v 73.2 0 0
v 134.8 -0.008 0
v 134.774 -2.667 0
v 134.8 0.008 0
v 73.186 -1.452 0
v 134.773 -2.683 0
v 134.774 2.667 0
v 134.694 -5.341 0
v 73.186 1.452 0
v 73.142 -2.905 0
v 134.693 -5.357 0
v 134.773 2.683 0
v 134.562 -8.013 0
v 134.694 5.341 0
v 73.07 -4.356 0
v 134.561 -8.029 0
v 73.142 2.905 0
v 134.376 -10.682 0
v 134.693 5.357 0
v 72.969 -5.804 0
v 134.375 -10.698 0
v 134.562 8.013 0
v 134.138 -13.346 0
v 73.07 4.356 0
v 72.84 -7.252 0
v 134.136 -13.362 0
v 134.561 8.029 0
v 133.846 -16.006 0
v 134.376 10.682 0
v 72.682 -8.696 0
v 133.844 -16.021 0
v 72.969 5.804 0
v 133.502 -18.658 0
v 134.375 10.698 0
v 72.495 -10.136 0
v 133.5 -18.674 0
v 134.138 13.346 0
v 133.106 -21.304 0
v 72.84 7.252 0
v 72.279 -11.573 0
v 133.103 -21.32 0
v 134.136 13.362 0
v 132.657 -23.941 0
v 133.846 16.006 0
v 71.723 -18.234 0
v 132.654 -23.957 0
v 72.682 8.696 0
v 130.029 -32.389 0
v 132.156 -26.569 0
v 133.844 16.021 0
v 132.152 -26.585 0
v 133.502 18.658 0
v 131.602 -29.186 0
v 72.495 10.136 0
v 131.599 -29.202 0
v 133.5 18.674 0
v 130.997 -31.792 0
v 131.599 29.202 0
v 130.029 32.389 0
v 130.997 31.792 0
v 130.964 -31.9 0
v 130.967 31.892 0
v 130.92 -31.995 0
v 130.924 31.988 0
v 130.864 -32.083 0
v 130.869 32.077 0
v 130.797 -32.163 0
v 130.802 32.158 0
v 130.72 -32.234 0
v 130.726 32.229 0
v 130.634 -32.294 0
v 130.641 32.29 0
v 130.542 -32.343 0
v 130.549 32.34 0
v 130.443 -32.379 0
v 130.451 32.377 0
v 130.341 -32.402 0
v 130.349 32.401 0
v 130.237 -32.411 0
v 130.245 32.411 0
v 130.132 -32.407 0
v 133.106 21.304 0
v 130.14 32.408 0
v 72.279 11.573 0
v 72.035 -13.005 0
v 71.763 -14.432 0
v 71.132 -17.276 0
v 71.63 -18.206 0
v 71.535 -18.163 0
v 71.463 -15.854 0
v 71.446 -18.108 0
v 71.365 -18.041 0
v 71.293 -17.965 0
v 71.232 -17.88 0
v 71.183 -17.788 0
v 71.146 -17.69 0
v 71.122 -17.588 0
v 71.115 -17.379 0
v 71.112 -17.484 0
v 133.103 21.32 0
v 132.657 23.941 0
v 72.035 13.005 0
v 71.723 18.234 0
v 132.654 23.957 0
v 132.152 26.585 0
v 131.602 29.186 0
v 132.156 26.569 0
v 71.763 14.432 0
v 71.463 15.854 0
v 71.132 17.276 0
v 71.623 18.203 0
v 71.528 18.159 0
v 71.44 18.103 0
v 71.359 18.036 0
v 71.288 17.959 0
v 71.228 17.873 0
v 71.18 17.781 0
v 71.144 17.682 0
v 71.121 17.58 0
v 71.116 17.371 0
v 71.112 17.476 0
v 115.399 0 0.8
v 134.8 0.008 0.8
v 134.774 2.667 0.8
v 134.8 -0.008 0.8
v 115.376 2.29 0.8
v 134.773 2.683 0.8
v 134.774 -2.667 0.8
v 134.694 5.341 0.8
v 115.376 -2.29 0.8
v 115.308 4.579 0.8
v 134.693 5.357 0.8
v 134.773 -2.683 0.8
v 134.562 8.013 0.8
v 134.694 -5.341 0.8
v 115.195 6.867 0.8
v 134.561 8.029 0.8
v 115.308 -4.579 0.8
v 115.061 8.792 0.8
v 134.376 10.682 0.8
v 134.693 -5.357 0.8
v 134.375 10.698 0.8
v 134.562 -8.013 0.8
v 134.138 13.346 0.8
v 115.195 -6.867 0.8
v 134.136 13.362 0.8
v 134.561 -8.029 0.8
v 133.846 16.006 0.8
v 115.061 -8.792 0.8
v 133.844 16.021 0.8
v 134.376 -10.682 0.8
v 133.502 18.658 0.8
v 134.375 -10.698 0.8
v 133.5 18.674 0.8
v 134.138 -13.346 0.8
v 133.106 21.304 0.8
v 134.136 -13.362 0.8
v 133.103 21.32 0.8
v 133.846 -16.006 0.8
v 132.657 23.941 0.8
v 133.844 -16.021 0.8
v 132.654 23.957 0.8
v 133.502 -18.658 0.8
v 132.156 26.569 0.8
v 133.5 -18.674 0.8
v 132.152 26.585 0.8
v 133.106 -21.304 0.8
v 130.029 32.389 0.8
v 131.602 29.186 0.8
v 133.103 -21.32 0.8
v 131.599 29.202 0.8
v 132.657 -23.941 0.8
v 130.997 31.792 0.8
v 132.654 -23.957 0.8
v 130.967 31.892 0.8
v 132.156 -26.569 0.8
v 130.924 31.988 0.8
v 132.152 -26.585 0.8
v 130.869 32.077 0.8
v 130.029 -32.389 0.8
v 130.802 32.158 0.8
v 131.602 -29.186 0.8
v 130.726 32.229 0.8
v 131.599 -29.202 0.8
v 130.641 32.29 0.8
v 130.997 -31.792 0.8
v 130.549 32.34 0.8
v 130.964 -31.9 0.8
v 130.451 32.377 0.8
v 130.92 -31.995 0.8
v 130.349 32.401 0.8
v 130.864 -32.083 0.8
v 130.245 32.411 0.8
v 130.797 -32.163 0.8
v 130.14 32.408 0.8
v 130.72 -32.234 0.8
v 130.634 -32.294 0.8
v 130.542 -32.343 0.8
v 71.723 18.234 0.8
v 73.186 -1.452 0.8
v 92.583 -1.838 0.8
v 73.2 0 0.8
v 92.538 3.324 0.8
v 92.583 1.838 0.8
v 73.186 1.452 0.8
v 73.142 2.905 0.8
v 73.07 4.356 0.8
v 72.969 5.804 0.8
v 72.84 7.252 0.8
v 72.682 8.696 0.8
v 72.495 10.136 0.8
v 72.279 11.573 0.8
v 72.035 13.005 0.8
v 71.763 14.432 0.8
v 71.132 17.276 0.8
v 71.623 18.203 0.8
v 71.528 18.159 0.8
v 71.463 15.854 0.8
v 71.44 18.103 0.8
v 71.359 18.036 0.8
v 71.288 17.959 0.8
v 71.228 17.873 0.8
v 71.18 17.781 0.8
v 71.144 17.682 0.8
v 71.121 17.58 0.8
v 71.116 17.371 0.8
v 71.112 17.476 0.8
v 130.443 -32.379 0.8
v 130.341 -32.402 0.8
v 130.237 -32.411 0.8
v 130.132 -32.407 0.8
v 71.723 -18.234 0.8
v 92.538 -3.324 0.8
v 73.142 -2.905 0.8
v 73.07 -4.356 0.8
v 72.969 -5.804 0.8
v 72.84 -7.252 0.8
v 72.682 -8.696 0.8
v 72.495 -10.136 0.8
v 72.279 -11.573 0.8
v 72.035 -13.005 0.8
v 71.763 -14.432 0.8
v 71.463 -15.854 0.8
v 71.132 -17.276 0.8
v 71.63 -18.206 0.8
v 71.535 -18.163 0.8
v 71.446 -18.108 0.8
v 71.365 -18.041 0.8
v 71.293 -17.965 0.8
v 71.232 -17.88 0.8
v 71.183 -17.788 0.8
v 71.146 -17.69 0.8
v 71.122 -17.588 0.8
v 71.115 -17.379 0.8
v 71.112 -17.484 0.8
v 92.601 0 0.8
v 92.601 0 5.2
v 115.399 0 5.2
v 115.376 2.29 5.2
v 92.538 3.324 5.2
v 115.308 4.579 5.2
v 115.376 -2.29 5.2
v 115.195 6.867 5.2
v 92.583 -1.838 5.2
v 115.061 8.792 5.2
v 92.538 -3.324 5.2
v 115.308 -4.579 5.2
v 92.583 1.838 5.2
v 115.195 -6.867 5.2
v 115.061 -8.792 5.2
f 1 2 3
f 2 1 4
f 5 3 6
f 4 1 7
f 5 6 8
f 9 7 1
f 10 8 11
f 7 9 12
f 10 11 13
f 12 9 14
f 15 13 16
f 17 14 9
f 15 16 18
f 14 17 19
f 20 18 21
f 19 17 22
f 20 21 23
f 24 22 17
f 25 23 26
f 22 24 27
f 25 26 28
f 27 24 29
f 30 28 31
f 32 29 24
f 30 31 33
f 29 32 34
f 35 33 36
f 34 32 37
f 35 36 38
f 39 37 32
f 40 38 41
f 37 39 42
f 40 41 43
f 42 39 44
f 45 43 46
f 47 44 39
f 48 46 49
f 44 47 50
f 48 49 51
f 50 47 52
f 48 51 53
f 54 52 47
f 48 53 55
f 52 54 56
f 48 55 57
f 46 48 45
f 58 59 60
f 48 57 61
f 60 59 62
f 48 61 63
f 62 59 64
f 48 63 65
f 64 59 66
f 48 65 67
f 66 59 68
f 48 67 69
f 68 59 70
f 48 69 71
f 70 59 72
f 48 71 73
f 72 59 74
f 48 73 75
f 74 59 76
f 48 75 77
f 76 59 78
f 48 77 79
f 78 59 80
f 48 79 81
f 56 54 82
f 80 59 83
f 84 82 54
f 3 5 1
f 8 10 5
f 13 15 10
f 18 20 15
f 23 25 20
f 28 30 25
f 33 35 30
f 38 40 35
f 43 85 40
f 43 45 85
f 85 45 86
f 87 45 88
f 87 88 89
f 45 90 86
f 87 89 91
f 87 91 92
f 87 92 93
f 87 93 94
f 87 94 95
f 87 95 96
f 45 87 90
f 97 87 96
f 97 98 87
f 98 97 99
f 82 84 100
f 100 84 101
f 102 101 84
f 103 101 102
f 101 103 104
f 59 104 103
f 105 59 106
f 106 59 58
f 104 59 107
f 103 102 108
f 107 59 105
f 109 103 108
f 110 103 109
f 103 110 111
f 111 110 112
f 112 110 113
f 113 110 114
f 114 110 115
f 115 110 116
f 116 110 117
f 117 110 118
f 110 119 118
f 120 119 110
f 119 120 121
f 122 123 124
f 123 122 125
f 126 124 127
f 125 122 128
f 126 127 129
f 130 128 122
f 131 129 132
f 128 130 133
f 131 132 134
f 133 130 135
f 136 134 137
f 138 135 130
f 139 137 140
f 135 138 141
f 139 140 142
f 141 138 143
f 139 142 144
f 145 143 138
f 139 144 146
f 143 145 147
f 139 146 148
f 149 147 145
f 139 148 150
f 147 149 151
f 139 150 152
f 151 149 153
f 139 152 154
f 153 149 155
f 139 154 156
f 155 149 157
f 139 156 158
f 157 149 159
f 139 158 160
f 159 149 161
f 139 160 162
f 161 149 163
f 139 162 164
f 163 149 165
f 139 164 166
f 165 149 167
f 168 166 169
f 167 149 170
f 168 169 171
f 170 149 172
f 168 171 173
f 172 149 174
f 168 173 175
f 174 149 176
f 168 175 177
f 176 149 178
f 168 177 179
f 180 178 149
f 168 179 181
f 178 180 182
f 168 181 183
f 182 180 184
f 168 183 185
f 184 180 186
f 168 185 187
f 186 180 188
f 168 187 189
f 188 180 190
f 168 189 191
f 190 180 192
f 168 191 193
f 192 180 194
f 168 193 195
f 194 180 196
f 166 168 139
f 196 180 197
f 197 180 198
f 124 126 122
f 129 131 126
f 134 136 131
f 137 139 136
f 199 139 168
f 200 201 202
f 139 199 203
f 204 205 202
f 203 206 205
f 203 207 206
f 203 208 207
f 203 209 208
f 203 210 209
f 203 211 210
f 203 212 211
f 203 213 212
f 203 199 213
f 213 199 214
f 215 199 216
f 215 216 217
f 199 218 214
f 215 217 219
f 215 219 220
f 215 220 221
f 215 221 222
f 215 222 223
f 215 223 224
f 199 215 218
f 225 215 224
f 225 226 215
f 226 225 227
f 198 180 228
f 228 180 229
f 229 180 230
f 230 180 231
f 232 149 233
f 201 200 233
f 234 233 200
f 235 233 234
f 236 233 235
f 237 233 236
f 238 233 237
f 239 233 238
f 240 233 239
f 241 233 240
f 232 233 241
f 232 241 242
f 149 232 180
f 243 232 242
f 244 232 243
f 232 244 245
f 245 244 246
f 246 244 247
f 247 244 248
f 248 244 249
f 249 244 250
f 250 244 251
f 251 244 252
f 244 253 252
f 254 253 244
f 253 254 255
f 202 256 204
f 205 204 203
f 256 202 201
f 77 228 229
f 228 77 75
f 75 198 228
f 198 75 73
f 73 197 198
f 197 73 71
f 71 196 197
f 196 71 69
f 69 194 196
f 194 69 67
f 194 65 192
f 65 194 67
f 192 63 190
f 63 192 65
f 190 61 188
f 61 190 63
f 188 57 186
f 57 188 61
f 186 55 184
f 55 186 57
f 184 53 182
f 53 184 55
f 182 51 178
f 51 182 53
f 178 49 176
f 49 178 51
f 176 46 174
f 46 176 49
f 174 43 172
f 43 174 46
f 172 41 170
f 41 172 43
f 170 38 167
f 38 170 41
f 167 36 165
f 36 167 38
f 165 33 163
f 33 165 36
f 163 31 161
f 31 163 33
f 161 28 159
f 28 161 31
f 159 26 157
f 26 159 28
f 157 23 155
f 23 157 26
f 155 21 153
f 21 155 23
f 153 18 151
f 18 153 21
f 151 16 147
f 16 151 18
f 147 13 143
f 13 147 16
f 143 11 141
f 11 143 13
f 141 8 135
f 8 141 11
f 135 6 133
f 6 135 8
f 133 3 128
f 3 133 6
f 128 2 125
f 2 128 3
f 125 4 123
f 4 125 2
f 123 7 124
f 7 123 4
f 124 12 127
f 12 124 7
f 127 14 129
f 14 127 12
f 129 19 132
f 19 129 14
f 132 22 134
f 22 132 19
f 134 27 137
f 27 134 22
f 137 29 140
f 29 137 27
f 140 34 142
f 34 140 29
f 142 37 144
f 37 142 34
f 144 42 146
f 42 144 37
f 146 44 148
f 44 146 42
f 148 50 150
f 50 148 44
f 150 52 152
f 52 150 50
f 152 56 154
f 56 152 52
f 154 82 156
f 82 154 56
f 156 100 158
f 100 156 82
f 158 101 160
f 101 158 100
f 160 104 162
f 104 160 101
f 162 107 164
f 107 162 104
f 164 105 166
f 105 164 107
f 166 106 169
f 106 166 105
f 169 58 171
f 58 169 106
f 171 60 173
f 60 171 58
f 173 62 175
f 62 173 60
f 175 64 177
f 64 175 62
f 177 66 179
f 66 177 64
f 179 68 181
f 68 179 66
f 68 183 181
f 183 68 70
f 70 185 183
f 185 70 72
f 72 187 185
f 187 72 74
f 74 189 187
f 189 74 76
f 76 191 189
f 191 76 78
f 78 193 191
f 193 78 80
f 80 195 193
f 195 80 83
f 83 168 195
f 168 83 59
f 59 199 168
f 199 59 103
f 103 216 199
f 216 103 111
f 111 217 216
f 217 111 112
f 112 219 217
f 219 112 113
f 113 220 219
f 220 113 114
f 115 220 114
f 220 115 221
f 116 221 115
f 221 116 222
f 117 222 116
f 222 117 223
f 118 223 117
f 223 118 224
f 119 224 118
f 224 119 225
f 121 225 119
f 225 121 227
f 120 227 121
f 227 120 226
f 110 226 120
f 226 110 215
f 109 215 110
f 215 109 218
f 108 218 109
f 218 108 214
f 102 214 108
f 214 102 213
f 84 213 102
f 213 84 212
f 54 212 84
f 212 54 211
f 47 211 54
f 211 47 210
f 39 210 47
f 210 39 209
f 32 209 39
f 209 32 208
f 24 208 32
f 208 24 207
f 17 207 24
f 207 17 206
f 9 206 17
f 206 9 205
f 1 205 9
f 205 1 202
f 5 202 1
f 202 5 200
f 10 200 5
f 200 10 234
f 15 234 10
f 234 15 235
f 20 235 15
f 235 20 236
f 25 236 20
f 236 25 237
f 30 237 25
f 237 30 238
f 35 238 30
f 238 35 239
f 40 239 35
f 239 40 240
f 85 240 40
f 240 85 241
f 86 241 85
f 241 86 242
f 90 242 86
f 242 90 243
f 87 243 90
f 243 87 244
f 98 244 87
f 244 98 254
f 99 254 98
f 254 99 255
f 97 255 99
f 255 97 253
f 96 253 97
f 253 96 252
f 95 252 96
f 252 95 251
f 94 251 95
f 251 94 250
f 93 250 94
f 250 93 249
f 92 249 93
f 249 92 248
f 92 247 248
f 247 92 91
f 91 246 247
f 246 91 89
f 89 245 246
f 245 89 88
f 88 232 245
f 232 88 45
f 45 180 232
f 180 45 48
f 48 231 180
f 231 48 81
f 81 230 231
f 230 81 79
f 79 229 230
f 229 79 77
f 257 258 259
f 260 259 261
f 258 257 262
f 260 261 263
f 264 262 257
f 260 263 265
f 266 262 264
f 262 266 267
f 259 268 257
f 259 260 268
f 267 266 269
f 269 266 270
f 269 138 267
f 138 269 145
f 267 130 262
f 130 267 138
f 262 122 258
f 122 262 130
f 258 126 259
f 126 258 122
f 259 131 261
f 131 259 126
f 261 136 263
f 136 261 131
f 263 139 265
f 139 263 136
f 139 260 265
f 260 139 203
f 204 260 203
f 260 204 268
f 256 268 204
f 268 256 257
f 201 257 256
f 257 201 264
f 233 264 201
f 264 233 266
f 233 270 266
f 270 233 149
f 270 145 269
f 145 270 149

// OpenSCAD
// Gen-DI — bobbin BASE (bottom flange + hub). Print x12, flange down. Wind 24 AWG x 223 t around
// the hub with the LID glued on (coil_lid.stl). Copper lives ONLY between the flanges (no proud winds).
include <parameters.scad>;
$fn = 48;
module sector_2d(r_in, r_out, ang) {
    polygon([
        for (a = [-ang/2 : ang/24 : ang/2]) [r_in*cos(a), r_in*sin(a)],
        for (a = [ang/2 : -ang/24 : -ang/2]) [r_out*cos(a), r_out*sin(a)]
    ]);
}
module footprint_2d() { offset(r=wall) sector_2d(coil_id_r, coil_od_r, span_deg); }
module hub_2d()       { offset(delta=-coil_core_inset) sector_2d(coil_id_r, coil_od_r, span_deg); }

union() {
    linear_extrude(flange_t) footprint_2d();
    translate([0, 0, flange_t - 0.01]) linear_extrude(former_web + 0.01) hub_2d();
}
